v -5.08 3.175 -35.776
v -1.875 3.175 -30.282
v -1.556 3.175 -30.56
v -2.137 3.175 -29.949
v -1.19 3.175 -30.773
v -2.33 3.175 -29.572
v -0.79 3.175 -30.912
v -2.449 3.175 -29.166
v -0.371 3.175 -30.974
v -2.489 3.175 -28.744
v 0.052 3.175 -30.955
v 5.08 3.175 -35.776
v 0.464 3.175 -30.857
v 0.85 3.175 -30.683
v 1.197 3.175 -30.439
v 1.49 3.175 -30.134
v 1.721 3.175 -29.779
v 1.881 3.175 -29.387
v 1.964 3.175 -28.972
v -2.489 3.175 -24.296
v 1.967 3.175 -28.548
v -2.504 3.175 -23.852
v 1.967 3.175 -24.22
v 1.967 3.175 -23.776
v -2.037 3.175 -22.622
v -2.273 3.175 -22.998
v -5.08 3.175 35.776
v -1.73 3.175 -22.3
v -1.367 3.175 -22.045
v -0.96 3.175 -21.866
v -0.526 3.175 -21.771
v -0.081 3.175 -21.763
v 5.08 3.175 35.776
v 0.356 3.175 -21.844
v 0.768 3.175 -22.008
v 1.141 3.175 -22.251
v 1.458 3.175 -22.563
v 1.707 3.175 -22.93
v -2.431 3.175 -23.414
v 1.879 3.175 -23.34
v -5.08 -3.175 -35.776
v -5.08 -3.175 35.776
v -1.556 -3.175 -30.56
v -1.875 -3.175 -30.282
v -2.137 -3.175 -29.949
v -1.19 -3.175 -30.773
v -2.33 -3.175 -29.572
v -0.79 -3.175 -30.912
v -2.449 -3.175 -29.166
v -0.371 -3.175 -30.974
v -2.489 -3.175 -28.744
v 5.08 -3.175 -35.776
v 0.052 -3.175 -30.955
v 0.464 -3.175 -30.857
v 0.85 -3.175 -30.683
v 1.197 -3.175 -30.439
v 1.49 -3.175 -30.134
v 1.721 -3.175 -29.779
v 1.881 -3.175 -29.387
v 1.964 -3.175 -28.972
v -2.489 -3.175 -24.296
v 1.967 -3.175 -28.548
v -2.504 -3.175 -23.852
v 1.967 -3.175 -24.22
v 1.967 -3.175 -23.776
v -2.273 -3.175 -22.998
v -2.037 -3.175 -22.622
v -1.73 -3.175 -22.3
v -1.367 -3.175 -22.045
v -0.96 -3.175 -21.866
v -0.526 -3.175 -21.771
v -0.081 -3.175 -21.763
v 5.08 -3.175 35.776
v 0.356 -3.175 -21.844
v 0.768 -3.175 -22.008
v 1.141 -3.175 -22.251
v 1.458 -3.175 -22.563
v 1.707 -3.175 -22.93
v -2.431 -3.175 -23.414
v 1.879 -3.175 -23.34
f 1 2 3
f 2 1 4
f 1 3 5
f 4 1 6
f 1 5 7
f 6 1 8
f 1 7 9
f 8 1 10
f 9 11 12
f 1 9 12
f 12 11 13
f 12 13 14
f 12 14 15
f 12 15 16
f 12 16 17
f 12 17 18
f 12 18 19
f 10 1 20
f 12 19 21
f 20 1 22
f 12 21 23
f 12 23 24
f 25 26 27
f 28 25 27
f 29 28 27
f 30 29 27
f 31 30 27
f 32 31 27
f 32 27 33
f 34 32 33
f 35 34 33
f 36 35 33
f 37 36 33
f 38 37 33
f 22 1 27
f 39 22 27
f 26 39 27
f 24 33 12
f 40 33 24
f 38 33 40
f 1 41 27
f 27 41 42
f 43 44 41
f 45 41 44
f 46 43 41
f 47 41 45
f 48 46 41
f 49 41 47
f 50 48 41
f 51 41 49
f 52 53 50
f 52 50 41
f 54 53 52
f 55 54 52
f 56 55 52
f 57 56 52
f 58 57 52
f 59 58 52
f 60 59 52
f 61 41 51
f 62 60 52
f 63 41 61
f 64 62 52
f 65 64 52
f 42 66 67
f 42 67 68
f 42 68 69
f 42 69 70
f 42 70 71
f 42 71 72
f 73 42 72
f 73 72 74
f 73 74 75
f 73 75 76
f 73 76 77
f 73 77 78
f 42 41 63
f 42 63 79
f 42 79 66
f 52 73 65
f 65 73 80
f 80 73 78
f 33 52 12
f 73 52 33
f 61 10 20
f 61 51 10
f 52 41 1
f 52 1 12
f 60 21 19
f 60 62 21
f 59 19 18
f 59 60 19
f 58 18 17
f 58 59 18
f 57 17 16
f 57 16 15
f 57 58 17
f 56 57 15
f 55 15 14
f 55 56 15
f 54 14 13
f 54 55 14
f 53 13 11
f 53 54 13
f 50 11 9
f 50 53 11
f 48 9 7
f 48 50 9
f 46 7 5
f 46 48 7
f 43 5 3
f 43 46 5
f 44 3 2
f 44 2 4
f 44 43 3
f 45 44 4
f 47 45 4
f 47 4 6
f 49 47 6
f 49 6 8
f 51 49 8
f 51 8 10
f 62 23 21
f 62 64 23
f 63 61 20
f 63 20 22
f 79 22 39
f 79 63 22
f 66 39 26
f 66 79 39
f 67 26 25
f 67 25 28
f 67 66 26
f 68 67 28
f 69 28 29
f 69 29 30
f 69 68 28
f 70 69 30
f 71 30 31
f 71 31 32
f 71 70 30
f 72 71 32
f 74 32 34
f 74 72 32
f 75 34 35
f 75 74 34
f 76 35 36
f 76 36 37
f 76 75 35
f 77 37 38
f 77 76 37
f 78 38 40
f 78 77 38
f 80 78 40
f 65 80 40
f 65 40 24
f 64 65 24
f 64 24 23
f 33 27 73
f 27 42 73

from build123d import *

# Parameters (mm, degrees)
F0_W     = 10.16
F0_H     = 71.552346
F1_DEPTH = 3.175


with BuildPart() as f1:
    # F0 (on Front) → F1 (new body, symmetric)
    with BuildSketch(Plane.XZ):
        Rectangle(F0_W, F0_H)
        with BuildLine():
            ThreePointArc((-2.489432, -24.29621), (-0.303735, -21.756134), (1.967174, -24.220324))
            Line((1.967174, -24.220324), (1.967174, -28.548131))
            ThreePointArc((1.967174, -28.548131), (-0.15872, -30.974596), (-2.489432, -28.744139))
            Line((-2.489432, -28.744139), (-2.489432, -24.29621))
        make_face(mode=Mode.SUBTRACT)
    extrude(amount=F1_DEPTH, both=True)


solid = f1.part
